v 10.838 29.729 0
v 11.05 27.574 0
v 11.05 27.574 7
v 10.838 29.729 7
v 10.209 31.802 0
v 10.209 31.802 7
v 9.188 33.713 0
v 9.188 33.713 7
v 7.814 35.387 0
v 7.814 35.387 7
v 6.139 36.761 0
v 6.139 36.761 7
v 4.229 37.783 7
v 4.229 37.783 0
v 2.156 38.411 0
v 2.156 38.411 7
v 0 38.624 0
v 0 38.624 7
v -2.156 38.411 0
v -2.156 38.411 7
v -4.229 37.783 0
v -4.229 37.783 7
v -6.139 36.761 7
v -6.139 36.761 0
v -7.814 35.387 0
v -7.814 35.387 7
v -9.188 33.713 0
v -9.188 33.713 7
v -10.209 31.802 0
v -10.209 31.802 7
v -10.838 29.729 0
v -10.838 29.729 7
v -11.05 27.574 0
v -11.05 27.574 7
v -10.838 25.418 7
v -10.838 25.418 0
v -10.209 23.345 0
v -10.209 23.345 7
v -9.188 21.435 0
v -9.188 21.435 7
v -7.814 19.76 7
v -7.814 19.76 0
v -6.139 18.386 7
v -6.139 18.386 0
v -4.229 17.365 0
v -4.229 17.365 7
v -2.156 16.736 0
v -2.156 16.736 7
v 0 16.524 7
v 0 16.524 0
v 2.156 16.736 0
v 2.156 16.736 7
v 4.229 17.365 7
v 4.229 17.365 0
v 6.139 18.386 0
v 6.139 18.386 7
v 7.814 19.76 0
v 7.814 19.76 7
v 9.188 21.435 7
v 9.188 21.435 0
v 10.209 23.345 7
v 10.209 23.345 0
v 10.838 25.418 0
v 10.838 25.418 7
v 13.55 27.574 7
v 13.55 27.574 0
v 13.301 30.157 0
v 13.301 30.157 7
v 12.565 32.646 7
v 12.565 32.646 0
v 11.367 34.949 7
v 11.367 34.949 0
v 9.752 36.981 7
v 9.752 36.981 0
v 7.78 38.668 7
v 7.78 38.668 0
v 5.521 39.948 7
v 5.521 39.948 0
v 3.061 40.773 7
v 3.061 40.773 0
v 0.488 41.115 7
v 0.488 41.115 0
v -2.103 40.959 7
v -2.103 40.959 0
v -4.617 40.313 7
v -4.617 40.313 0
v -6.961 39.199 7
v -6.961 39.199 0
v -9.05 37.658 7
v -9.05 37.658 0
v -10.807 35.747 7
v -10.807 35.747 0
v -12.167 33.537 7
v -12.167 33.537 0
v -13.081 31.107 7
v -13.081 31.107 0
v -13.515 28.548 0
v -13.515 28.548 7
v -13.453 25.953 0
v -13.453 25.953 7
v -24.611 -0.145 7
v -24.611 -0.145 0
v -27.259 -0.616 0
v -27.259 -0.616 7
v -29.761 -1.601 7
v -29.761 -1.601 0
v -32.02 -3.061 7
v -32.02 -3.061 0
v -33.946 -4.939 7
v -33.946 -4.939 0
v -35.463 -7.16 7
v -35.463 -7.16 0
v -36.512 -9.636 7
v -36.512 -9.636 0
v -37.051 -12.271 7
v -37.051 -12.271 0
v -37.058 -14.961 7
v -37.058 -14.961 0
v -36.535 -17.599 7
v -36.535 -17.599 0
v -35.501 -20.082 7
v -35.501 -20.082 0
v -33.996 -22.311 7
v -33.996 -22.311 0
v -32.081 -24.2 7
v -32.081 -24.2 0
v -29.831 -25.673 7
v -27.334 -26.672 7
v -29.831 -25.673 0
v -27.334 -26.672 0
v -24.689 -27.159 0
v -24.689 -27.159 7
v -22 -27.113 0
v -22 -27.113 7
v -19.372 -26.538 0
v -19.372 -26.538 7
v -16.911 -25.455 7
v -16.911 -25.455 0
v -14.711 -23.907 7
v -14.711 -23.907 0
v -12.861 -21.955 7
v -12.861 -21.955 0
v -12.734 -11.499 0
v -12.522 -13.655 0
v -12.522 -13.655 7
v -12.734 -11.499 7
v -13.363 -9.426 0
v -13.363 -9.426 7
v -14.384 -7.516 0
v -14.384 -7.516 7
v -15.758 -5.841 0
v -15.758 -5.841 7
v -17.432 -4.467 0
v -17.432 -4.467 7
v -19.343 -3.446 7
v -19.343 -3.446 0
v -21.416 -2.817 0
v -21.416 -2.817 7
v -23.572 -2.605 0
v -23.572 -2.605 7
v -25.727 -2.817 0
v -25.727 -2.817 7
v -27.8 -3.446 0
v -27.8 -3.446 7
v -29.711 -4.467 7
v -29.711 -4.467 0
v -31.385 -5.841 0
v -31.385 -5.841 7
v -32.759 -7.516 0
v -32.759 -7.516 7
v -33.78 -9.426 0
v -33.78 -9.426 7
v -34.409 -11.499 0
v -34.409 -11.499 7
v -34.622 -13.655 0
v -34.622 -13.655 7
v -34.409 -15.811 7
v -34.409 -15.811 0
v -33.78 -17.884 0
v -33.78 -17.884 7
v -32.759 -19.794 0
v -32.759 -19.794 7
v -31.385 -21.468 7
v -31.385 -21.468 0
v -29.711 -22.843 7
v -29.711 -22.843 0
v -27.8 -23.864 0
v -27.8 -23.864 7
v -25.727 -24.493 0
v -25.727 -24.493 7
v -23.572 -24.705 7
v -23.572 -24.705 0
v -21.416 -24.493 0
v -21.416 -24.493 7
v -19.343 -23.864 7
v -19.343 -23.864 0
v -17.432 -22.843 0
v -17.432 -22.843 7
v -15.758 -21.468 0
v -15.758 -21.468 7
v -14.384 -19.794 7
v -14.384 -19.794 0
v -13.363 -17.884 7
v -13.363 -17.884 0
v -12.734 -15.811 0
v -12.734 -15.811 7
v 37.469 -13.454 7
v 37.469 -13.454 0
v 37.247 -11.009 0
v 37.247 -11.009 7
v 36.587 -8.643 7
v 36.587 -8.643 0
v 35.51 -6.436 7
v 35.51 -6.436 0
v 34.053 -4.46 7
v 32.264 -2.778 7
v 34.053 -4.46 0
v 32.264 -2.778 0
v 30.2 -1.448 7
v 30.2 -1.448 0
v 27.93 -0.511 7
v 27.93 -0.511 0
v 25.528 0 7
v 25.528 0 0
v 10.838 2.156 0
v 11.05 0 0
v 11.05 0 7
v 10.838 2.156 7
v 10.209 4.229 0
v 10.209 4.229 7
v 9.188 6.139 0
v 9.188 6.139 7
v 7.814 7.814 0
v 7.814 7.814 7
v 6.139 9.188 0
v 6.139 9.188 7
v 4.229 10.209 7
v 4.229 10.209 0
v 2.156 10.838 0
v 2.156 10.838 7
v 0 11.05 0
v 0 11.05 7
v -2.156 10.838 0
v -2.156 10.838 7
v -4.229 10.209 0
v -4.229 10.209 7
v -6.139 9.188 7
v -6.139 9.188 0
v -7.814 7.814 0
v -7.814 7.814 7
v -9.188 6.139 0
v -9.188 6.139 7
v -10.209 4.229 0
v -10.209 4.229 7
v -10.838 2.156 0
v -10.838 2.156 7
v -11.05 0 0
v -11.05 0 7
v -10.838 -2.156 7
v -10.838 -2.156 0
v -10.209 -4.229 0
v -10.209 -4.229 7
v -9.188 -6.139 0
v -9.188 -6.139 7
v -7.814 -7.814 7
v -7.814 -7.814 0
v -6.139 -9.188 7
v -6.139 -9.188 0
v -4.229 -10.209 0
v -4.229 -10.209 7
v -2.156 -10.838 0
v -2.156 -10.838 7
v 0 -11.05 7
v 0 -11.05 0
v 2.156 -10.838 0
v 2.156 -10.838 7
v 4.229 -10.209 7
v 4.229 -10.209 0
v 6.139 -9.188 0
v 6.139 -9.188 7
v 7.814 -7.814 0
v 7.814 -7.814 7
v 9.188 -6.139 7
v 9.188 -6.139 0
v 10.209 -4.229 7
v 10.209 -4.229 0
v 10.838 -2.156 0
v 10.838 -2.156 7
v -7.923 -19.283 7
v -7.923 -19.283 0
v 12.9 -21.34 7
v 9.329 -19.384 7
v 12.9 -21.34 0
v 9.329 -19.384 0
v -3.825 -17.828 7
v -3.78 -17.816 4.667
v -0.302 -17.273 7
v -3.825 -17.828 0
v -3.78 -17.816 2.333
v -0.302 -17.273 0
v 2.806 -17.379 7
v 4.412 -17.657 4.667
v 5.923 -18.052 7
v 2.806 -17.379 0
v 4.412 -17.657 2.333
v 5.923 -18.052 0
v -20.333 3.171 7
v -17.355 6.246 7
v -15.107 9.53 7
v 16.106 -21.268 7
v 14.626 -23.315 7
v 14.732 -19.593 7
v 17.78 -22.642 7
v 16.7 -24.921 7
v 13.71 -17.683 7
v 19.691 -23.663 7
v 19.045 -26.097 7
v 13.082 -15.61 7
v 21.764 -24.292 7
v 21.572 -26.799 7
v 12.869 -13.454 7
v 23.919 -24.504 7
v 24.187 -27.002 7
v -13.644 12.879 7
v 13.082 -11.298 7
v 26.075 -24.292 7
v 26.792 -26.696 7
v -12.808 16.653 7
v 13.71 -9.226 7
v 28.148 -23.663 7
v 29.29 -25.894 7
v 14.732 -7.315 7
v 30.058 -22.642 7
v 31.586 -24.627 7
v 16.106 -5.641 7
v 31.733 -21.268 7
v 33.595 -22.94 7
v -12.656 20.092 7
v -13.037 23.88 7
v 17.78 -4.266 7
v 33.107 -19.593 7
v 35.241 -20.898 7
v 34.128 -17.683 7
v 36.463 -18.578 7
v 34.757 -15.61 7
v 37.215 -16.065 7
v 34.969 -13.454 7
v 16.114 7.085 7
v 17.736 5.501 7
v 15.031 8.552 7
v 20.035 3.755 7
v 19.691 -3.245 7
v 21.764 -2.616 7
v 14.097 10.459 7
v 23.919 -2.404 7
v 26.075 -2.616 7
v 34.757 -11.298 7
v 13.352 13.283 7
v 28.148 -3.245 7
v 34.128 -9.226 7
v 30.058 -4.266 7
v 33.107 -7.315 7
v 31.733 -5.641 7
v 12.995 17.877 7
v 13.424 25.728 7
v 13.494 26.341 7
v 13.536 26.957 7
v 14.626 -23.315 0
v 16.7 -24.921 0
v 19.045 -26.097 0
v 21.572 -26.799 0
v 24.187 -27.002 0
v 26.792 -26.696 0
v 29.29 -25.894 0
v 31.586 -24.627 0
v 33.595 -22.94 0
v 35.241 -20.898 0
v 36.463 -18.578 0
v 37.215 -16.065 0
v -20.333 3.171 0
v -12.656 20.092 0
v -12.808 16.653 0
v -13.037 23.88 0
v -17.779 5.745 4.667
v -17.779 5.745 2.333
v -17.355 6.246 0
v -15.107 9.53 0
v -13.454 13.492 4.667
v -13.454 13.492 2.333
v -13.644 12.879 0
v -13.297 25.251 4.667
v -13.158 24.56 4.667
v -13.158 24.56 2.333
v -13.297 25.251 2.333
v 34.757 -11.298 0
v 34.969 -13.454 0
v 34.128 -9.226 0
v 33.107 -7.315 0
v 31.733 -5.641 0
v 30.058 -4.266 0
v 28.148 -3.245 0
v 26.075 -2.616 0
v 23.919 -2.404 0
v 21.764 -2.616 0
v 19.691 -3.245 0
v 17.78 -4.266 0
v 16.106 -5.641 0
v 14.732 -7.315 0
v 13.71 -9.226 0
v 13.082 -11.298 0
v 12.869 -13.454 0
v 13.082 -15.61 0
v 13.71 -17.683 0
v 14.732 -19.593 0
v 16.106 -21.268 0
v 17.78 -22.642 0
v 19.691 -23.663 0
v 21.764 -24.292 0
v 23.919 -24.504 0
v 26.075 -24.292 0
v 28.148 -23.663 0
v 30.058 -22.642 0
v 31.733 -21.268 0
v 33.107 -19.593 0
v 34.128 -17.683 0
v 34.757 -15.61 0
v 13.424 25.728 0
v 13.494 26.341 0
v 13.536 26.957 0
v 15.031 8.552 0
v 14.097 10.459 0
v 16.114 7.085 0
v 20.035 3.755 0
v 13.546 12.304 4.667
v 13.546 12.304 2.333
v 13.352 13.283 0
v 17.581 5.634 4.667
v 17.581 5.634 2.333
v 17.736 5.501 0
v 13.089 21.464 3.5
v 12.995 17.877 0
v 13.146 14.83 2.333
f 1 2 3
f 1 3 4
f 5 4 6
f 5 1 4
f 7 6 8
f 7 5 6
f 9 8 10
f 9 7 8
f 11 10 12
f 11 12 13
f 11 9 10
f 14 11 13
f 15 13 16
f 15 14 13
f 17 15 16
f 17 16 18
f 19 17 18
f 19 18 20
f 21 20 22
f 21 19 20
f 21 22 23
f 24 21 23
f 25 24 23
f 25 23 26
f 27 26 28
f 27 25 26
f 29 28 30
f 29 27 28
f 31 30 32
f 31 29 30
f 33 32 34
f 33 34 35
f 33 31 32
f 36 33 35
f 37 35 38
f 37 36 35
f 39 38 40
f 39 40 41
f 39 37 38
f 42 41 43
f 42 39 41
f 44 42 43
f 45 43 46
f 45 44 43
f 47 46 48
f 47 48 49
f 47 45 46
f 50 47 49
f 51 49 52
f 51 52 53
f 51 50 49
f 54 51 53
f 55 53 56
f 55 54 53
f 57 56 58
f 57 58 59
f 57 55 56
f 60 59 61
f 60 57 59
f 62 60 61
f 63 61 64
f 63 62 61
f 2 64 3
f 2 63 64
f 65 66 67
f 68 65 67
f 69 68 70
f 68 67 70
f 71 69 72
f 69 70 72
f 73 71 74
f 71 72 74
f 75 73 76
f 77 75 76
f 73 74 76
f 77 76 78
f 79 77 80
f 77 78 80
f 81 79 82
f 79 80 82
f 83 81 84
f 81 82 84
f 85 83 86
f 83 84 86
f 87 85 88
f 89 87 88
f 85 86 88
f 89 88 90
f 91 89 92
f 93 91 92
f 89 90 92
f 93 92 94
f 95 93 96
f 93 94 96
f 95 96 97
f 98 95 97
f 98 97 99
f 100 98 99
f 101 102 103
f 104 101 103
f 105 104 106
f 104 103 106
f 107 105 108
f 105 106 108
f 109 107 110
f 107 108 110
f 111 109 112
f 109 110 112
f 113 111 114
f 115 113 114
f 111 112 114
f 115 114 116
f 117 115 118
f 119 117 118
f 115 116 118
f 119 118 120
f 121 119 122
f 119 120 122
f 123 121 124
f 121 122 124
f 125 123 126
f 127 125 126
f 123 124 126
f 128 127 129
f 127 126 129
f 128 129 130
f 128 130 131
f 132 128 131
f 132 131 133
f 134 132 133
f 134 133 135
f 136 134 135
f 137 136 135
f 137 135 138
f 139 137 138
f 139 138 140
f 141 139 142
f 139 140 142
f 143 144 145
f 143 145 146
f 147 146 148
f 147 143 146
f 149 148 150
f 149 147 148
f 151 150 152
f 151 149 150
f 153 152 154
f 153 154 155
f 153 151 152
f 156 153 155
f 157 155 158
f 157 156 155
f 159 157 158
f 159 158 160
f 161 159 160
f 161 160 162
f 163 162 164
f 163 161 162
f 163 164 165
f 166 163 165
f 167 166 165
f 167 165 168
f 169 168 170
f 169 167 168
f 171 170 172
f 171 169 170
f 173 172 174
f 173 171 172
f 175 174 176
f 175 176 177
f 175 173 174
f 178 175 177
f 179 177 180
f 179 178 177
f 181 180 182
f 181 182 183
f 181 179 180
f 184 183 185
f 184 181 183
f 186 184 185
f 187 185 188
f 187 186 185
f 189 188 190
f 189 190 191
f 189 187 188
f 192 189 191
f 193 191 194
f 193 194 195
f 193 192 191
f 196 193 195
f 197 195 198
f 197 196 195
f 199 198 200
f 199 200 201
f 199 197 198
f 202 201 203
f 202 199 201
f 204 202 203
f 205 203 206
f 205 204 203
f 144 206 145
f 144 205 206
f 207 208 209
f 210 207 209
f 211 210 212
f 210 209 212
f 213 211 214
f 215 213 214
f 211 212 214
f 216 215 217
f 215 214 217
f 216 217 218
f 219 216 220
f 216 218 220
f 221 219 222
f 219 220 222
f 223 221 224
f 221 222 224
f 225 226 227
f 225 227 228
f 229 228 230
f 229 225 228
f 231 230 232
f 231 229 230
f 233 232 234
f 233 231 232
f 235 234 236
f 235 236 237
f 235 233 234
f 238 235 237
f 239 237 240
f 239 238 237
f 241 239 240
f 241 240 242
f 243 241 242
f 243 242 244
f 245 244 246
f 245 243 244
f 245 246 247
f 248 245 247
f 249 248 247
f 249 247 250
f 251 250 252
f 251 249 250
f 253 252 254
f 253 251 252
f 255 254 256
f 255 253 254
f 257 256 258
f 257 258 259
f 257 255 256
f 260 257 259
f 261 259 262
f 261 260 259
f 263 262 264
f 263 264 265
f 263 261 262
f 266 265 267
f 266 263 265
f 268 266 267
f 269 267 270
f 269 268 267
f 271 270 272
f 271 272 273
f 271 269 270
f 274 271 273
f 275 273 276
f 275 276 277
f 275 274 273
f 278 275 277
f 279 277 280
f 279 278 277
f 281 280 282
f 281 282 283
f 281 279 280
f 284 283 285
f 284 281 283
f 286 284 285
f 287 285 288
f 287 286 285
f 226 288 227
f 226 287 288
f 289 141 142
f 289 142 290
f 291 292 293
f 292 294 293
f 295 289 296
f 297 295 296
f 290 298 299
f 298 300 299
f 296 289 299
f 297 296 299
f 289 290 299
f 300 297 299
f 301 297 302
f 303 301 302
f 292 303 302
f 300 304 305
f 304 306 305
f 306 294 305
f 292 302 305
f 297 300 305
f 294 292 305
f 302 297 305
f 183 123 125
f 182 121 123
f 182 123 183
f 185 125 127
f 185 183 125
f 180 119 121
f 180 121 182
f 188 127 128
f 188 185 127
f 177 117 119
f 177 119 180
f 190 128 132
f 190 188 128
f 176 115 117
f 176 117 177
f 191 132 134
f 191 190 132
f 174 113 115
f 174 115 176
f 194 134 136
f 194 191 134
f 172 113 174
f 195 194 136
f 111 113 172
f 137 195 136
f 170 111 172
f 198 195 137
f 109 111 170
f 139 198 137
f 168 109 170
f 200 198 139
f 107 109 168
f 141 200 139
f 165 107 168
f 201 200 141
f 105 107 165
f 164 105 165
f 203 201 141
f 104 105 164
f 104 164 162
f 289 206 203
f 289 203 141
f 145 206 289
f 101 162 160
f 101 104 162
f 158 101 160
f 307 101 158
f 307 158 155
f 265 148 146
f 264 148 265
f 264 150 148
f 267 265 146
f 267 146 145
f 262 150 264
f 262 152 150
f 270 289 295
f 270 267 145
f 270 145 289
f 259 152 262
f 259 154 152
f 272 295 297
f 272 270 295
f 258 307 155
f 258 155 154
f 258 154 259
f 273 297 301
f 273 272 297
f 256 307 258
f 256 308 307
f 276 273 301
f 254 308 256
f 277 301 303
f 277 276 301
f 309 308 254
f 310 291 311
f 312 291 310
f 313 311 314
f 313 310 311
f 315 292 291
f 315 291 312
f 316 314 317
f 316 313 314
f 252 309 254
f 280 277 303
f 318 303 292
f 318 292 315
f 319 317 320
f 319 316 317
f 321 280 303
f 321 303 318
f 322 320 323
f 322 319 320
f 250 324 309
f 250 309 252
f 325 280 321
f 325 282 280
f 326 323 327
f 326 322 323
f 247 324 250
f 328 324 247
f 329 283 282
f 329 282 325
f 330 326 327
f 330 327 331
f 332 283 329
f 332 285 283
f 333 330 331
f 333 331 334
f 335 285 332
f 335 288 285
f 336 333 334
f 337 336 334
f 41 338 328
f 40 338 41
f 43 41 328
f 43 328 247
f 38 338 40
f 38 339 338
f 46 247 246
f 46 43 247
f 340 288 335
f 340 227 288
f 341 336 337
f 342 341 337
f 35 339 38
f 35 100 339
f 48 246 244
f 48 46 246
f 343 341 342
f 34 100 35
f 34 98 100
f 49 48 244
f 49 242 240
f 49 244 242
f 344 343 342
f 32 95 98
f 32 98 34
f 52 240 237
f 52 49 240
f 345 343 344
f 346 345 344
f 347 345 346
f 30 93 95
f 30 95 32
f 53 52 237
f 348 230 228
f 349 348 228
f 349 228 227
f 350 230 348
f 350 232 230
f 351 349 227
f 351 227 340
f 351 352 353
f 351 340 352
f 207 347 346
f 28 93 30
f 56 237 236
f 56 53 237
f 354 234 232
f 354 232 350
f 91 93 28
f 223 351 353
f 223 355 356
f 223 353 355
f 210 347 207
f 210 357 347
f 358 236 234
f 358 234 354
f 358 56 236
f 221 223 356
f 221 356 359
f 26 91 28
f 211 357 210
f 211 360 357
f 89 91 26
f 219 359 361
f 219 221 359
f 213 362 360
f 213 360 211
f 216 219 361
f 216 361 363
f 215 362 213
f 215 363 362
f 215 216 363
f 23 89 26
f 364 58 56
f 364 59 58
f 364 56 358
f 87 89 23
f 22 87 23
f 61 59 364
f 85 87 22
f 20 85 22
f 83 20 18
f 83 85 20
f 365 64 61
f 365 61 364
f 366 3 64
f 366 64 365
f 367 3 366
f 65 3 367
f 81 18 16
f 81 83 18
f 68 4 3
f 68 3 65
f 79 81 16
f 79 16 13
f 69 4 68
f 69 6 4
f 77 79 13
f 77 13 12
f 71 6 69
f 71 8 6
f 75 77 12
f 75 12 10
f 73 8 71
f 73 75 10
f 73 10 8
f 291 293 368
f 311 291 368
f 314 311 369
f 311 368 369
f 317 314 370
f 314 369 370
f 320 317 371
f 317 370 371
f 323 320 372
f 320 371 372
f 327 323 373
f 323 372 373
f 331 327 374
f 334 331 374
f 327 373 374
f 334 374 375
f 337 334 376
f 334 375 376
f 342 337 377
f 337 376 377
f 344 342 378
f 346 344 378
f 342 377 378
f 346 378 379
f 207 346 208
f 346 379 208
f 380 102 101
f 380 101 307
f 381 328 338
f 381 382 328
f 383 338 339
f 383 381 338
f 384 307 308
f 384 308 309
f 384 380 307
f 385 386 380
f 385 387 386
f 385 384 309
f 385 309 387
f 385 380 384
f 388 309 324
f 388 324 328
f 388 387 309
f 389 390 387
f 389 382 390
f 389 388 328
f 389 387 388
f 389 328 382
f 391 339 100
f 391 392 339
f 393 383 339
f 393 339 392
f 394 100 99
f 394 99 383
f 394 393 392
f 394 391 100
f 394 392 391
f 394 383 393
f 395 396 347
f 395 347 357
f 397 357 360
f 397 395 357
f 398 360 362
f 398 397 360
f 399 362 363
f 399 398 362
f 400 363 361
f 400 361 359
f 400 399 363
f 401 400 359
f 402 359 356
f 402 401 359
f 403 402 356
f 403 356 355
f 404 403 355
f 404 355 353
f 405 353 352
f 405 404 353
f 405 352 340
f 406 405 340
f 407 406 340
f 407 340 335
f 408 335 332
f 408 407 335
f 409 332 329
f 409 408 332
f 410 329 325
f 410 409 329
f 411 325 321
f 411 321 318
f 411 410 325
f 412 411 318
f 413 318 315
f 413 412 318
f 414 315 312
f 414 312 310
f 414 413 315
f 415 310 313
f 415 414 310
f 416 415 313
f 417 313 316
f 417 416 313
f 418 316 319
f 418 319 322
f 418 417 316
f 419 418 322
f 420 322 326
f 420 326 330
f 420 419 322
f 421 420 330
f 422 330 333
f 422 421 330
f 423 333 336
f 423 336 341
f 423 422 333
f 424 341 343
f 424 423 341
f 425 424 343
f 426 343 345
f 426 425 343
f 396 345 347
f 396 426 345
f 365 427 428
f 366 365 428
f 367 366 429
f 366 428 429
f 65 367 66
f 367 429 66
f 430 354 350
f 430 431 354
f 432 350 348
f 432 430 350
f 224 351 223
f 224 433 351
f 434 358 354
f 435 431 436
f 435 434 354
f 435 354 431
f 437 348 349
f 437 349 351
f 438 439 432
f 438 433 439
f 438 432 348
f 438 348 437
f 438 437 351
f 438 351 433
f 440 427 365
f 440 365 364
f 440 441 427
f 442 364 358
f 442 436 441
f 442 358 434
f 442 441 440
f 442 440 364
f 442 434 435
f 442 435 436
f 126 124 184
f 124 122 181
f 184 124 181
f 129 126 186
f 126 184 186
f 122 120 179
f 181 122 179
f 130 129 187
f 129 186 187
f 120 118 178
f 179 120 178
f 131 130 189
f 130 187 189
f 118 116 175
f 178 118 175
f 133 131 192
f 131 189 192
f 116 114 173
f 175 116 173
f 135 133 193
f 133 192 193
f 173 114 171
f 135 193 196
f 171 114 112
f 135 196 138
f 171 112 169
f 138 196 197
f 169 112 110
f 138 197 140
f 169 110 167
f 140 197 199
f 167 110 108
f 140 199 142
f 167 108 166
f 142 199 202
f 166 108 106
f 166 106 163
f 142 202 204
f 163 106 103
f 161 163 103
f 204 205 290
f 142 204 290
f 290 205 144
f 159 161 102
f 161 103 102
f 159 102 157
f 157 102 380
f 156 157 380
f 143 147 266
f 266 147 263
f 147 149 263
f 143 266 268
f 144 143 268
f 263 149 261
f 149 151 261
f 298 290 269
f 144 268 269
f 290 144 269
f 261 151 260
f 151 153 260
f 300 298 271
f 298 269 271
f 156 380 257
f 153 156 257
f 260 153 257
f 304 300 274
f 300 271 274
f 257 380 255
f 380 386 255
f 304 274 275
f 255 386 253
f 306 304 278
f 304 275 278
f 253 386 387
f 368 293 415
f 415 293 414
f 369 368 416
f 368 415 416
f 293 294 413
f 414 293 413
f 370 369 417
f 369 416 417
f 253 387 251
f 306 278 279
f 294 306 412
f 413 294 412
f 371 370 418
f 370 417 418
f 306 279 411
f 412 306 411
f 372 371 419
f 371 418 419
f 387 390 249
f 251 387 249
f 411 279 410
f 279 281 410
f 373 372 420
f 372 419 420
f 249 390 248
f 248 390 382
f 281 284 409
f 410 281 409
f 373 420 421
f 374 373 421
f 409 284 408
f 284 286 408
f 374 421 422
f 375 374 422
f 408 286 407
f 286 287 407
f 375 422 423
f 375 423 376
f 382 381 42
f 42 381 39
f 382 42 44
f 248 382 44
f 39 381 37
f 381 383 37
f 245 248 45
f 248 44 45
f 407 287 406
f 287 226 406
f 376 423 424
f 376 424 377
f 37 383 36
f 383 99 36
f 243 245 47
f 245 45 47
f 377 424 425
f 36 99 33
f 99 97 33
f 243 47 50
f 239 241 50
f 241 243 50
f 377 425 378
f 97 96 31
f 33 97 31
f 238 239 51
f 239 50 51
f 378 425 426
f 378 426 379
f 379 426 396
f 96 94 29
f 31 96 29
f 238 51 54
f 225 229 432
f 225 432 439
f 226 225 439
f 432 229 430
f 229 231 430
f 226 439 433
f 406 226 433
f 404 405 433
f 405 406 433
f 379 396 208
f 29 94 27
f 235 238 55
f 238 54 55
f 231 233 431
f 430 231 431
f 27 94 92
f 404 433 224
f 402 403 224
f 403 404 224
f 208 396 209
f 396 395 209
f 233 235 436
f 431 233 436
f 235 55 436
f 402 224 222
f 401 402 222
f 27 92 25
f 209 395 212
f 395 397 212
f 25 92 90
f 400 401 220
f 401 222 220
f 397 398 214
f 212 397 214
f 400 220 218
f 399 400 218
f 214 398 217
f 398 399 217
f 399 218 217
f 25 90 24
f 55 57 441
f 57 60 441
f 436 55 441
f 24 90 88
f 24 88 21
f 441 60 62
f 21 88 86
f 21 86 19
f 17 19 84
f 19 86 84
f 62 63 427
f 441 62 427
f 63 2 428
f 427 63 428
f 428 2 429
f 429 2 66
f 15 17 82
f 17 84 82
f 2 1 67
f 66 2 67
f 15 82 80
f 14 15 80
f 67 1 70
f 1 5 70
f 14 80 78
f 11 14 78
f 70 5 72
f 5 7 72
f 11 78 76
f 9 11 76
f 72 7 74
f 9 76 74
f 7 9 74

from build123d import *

# Parameters (mm, degrees)
F0_R     = 11.05
F0_R_2   = 13.55
F1_DEPTH = 7


with BuildPart() as f1:
    # F0 (on Top) → F1 (new body)
    with BuildSketch(Plane.XY):
        with BuildLine():
            ThreePointArc((-10.021513, -13.654951), (-14.364957, -3.713029), (-24.610712, -0.14486))
            ThreePointArc((-24.610712, -0.14486), (-35.500503, -20.081591), (-12.860881, -21.954642))
            ThreePointArc((-12.860881, -21.954642), (-10.750991, -18.04092), (-10.021513, -13.654951))
        make_face()
        with Locations((-23.571513, -13.654951)):
            Circle(F0_R, mode=Mode.SUBTRACT)
        with BuildLine():
            ThreePointArc((13.423732, 25.728168), (13.518396, 26.648767), (13.55, 27.573681))
            ThreePointArc((13.55, 27.573681), (-0.81156, 41.099355), (-13.452785, 25.953474))
            add(Edge.make_bspline(
                [(-13.036801, 23.87986), (-13.14978, 24.554538), (-13.288064, 25.245532), (-13.452785, 25.953474)],
                knots=[26.868894, 26.868894, 26.868894, 26.868894, 28.383488, 28.383488, 28.383488, 28.383488], degree=3))
            ThreePointArc((-13.036801, 23.87986), (0.944187, 14.056617), (13.423732, 25.728168))
        make_face()
        with Locations((0, 27.573681)):
            Circle(F0_R, mode=Mode.SUBTRACT)
        with BuildLine():
            ThreePointArc((37.469286, -13.454165), (34.0534, -4.459598), (25.527997, 0))
            ThreePointArc((25.527997, 0), (12.257933, -6.553778), (12.900423, -21.340049))
            ThreePointArc((12.900423, -21.340049), (28.060355, -26.355872), (37.469286, -13.454165))
        make_face()
        with Locations((23.919286, -13.454165)):
            Circle(F0_R, mode=Mode.SUBTRACT)
        with BuildLine():
            add(Edge.make_bspline(
                [(13.423732, 25.728168), (11.58878, 7.021586), (15.626226, 7.021586), (25.527997, 0)],
                knots=[0, 0, 0, 0, 28.433288, 28.433288, 28.433288, 28.433288], degree=3))
            ThreePointArc((13.423732, 25.728168), (0.944187, 14.056617), (-13.036801, 23.87986))
            add(Edge.make_bspline(
                [(-24.610712, -0.14486), (-16.992516, 5.077212), (-11.032568, 11.911073), (-13.036801, 23.87986)],
                knots=[0, 0, 0, 0, 26.868894, 26.868894, 26.868894, 26.868894], degree=3))
            ThreePointArc((-24.610712, -0.14486), (-14.364957, -3.713029), (-10.021513, -13.654951))
            ThreePointArc((-10.021513, -13.654951), (-10.750991, -18.04092), (-12.860881, -21.954642))
            add(Edge.make_bspline(
                [(-12.860881, -21.954642), (-2.93959, -15.780944), (3.867878, -15.780944), (12.900423, -21.340049)],
                knots=[0, 0, 0, 0, 25.768635, 25.768635, 25.768635, 25.768635], degree=3))
            ThreePointArc((12.900423, -21.340049), (12.257933, -6.553778), (25.527997, 0))
        make_face()
        Circle(F0_R_2, mode=Mode.SUBTRACT)
        Circle(F0_R_2)
        Circle(F0_R, mode=Mode.SUBTRACT)
    extrude(amount=F1_DEPTH)


solid = f1.part
